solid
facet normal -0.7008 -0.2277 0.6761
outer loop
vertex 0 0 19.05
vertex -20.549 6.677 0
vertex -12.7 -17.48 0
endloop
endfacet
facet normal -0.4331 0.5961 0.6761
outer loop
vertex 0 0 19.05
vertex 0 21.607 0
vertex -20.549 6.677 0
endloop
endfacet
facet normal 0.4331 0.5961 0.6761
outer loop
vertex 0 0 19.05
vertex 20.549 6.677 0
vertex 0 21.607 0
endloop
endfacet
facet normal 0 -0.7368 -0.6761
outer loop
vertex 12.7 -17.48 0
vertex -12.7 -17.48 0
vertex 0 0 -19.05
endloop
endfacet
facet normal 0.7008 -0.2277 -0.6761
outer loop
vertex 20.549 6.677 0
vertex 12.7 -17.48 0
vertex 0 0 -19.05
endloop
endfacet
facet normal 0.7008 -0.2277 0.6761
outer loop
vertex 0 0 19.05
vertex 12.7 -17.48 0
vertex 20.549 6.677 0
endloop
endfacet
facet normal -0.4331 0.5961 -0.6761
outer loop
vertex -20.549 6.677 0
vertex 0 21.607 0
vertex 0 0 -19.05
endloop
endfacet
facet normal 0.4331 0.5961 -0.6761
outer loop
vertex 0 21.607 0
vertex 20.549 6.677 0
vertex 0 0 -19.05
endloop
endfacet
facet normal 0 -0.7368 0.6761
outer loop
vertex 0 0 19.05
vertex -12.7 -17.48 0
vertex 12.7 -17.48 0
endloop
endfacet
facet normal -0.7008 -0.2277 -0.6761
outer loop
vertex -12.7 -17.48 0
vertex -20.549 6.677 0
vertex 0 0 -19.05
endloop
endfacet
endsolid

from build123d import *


with BuildPart() as f2:
    # F0 (on Top) → F2 section 0
    with BuildSketch(Plane.XY, mode=Mode.PRIVATE) as f2_s0:
        Polygon((12.7, -17.48005039), (20.5490316571, 6.6767851239), (0, 21.6065305321), (-20.5490316571, 6.6767851239), (-12.7, -17.48005039), align=None)
    loft([f2_s0.sketch, Vertex(0, 0, 19.05)])

    # F0 (on Top) → F3 section 0
    with BuildSketch(Plane.XY, mode=Mode.PRIVATE) as f3_s0:
        Polygon((12.7, -17.48005039), (20.5490316571, 6.6767851239), (0, 21.6065305321), (-20.5490316571, 6.6767851239), (-12.7, -17.48005039), align=None)
    loft([f3_s0.sketch, Vertex(0, 0, -19.05)])


solid = f2.part
